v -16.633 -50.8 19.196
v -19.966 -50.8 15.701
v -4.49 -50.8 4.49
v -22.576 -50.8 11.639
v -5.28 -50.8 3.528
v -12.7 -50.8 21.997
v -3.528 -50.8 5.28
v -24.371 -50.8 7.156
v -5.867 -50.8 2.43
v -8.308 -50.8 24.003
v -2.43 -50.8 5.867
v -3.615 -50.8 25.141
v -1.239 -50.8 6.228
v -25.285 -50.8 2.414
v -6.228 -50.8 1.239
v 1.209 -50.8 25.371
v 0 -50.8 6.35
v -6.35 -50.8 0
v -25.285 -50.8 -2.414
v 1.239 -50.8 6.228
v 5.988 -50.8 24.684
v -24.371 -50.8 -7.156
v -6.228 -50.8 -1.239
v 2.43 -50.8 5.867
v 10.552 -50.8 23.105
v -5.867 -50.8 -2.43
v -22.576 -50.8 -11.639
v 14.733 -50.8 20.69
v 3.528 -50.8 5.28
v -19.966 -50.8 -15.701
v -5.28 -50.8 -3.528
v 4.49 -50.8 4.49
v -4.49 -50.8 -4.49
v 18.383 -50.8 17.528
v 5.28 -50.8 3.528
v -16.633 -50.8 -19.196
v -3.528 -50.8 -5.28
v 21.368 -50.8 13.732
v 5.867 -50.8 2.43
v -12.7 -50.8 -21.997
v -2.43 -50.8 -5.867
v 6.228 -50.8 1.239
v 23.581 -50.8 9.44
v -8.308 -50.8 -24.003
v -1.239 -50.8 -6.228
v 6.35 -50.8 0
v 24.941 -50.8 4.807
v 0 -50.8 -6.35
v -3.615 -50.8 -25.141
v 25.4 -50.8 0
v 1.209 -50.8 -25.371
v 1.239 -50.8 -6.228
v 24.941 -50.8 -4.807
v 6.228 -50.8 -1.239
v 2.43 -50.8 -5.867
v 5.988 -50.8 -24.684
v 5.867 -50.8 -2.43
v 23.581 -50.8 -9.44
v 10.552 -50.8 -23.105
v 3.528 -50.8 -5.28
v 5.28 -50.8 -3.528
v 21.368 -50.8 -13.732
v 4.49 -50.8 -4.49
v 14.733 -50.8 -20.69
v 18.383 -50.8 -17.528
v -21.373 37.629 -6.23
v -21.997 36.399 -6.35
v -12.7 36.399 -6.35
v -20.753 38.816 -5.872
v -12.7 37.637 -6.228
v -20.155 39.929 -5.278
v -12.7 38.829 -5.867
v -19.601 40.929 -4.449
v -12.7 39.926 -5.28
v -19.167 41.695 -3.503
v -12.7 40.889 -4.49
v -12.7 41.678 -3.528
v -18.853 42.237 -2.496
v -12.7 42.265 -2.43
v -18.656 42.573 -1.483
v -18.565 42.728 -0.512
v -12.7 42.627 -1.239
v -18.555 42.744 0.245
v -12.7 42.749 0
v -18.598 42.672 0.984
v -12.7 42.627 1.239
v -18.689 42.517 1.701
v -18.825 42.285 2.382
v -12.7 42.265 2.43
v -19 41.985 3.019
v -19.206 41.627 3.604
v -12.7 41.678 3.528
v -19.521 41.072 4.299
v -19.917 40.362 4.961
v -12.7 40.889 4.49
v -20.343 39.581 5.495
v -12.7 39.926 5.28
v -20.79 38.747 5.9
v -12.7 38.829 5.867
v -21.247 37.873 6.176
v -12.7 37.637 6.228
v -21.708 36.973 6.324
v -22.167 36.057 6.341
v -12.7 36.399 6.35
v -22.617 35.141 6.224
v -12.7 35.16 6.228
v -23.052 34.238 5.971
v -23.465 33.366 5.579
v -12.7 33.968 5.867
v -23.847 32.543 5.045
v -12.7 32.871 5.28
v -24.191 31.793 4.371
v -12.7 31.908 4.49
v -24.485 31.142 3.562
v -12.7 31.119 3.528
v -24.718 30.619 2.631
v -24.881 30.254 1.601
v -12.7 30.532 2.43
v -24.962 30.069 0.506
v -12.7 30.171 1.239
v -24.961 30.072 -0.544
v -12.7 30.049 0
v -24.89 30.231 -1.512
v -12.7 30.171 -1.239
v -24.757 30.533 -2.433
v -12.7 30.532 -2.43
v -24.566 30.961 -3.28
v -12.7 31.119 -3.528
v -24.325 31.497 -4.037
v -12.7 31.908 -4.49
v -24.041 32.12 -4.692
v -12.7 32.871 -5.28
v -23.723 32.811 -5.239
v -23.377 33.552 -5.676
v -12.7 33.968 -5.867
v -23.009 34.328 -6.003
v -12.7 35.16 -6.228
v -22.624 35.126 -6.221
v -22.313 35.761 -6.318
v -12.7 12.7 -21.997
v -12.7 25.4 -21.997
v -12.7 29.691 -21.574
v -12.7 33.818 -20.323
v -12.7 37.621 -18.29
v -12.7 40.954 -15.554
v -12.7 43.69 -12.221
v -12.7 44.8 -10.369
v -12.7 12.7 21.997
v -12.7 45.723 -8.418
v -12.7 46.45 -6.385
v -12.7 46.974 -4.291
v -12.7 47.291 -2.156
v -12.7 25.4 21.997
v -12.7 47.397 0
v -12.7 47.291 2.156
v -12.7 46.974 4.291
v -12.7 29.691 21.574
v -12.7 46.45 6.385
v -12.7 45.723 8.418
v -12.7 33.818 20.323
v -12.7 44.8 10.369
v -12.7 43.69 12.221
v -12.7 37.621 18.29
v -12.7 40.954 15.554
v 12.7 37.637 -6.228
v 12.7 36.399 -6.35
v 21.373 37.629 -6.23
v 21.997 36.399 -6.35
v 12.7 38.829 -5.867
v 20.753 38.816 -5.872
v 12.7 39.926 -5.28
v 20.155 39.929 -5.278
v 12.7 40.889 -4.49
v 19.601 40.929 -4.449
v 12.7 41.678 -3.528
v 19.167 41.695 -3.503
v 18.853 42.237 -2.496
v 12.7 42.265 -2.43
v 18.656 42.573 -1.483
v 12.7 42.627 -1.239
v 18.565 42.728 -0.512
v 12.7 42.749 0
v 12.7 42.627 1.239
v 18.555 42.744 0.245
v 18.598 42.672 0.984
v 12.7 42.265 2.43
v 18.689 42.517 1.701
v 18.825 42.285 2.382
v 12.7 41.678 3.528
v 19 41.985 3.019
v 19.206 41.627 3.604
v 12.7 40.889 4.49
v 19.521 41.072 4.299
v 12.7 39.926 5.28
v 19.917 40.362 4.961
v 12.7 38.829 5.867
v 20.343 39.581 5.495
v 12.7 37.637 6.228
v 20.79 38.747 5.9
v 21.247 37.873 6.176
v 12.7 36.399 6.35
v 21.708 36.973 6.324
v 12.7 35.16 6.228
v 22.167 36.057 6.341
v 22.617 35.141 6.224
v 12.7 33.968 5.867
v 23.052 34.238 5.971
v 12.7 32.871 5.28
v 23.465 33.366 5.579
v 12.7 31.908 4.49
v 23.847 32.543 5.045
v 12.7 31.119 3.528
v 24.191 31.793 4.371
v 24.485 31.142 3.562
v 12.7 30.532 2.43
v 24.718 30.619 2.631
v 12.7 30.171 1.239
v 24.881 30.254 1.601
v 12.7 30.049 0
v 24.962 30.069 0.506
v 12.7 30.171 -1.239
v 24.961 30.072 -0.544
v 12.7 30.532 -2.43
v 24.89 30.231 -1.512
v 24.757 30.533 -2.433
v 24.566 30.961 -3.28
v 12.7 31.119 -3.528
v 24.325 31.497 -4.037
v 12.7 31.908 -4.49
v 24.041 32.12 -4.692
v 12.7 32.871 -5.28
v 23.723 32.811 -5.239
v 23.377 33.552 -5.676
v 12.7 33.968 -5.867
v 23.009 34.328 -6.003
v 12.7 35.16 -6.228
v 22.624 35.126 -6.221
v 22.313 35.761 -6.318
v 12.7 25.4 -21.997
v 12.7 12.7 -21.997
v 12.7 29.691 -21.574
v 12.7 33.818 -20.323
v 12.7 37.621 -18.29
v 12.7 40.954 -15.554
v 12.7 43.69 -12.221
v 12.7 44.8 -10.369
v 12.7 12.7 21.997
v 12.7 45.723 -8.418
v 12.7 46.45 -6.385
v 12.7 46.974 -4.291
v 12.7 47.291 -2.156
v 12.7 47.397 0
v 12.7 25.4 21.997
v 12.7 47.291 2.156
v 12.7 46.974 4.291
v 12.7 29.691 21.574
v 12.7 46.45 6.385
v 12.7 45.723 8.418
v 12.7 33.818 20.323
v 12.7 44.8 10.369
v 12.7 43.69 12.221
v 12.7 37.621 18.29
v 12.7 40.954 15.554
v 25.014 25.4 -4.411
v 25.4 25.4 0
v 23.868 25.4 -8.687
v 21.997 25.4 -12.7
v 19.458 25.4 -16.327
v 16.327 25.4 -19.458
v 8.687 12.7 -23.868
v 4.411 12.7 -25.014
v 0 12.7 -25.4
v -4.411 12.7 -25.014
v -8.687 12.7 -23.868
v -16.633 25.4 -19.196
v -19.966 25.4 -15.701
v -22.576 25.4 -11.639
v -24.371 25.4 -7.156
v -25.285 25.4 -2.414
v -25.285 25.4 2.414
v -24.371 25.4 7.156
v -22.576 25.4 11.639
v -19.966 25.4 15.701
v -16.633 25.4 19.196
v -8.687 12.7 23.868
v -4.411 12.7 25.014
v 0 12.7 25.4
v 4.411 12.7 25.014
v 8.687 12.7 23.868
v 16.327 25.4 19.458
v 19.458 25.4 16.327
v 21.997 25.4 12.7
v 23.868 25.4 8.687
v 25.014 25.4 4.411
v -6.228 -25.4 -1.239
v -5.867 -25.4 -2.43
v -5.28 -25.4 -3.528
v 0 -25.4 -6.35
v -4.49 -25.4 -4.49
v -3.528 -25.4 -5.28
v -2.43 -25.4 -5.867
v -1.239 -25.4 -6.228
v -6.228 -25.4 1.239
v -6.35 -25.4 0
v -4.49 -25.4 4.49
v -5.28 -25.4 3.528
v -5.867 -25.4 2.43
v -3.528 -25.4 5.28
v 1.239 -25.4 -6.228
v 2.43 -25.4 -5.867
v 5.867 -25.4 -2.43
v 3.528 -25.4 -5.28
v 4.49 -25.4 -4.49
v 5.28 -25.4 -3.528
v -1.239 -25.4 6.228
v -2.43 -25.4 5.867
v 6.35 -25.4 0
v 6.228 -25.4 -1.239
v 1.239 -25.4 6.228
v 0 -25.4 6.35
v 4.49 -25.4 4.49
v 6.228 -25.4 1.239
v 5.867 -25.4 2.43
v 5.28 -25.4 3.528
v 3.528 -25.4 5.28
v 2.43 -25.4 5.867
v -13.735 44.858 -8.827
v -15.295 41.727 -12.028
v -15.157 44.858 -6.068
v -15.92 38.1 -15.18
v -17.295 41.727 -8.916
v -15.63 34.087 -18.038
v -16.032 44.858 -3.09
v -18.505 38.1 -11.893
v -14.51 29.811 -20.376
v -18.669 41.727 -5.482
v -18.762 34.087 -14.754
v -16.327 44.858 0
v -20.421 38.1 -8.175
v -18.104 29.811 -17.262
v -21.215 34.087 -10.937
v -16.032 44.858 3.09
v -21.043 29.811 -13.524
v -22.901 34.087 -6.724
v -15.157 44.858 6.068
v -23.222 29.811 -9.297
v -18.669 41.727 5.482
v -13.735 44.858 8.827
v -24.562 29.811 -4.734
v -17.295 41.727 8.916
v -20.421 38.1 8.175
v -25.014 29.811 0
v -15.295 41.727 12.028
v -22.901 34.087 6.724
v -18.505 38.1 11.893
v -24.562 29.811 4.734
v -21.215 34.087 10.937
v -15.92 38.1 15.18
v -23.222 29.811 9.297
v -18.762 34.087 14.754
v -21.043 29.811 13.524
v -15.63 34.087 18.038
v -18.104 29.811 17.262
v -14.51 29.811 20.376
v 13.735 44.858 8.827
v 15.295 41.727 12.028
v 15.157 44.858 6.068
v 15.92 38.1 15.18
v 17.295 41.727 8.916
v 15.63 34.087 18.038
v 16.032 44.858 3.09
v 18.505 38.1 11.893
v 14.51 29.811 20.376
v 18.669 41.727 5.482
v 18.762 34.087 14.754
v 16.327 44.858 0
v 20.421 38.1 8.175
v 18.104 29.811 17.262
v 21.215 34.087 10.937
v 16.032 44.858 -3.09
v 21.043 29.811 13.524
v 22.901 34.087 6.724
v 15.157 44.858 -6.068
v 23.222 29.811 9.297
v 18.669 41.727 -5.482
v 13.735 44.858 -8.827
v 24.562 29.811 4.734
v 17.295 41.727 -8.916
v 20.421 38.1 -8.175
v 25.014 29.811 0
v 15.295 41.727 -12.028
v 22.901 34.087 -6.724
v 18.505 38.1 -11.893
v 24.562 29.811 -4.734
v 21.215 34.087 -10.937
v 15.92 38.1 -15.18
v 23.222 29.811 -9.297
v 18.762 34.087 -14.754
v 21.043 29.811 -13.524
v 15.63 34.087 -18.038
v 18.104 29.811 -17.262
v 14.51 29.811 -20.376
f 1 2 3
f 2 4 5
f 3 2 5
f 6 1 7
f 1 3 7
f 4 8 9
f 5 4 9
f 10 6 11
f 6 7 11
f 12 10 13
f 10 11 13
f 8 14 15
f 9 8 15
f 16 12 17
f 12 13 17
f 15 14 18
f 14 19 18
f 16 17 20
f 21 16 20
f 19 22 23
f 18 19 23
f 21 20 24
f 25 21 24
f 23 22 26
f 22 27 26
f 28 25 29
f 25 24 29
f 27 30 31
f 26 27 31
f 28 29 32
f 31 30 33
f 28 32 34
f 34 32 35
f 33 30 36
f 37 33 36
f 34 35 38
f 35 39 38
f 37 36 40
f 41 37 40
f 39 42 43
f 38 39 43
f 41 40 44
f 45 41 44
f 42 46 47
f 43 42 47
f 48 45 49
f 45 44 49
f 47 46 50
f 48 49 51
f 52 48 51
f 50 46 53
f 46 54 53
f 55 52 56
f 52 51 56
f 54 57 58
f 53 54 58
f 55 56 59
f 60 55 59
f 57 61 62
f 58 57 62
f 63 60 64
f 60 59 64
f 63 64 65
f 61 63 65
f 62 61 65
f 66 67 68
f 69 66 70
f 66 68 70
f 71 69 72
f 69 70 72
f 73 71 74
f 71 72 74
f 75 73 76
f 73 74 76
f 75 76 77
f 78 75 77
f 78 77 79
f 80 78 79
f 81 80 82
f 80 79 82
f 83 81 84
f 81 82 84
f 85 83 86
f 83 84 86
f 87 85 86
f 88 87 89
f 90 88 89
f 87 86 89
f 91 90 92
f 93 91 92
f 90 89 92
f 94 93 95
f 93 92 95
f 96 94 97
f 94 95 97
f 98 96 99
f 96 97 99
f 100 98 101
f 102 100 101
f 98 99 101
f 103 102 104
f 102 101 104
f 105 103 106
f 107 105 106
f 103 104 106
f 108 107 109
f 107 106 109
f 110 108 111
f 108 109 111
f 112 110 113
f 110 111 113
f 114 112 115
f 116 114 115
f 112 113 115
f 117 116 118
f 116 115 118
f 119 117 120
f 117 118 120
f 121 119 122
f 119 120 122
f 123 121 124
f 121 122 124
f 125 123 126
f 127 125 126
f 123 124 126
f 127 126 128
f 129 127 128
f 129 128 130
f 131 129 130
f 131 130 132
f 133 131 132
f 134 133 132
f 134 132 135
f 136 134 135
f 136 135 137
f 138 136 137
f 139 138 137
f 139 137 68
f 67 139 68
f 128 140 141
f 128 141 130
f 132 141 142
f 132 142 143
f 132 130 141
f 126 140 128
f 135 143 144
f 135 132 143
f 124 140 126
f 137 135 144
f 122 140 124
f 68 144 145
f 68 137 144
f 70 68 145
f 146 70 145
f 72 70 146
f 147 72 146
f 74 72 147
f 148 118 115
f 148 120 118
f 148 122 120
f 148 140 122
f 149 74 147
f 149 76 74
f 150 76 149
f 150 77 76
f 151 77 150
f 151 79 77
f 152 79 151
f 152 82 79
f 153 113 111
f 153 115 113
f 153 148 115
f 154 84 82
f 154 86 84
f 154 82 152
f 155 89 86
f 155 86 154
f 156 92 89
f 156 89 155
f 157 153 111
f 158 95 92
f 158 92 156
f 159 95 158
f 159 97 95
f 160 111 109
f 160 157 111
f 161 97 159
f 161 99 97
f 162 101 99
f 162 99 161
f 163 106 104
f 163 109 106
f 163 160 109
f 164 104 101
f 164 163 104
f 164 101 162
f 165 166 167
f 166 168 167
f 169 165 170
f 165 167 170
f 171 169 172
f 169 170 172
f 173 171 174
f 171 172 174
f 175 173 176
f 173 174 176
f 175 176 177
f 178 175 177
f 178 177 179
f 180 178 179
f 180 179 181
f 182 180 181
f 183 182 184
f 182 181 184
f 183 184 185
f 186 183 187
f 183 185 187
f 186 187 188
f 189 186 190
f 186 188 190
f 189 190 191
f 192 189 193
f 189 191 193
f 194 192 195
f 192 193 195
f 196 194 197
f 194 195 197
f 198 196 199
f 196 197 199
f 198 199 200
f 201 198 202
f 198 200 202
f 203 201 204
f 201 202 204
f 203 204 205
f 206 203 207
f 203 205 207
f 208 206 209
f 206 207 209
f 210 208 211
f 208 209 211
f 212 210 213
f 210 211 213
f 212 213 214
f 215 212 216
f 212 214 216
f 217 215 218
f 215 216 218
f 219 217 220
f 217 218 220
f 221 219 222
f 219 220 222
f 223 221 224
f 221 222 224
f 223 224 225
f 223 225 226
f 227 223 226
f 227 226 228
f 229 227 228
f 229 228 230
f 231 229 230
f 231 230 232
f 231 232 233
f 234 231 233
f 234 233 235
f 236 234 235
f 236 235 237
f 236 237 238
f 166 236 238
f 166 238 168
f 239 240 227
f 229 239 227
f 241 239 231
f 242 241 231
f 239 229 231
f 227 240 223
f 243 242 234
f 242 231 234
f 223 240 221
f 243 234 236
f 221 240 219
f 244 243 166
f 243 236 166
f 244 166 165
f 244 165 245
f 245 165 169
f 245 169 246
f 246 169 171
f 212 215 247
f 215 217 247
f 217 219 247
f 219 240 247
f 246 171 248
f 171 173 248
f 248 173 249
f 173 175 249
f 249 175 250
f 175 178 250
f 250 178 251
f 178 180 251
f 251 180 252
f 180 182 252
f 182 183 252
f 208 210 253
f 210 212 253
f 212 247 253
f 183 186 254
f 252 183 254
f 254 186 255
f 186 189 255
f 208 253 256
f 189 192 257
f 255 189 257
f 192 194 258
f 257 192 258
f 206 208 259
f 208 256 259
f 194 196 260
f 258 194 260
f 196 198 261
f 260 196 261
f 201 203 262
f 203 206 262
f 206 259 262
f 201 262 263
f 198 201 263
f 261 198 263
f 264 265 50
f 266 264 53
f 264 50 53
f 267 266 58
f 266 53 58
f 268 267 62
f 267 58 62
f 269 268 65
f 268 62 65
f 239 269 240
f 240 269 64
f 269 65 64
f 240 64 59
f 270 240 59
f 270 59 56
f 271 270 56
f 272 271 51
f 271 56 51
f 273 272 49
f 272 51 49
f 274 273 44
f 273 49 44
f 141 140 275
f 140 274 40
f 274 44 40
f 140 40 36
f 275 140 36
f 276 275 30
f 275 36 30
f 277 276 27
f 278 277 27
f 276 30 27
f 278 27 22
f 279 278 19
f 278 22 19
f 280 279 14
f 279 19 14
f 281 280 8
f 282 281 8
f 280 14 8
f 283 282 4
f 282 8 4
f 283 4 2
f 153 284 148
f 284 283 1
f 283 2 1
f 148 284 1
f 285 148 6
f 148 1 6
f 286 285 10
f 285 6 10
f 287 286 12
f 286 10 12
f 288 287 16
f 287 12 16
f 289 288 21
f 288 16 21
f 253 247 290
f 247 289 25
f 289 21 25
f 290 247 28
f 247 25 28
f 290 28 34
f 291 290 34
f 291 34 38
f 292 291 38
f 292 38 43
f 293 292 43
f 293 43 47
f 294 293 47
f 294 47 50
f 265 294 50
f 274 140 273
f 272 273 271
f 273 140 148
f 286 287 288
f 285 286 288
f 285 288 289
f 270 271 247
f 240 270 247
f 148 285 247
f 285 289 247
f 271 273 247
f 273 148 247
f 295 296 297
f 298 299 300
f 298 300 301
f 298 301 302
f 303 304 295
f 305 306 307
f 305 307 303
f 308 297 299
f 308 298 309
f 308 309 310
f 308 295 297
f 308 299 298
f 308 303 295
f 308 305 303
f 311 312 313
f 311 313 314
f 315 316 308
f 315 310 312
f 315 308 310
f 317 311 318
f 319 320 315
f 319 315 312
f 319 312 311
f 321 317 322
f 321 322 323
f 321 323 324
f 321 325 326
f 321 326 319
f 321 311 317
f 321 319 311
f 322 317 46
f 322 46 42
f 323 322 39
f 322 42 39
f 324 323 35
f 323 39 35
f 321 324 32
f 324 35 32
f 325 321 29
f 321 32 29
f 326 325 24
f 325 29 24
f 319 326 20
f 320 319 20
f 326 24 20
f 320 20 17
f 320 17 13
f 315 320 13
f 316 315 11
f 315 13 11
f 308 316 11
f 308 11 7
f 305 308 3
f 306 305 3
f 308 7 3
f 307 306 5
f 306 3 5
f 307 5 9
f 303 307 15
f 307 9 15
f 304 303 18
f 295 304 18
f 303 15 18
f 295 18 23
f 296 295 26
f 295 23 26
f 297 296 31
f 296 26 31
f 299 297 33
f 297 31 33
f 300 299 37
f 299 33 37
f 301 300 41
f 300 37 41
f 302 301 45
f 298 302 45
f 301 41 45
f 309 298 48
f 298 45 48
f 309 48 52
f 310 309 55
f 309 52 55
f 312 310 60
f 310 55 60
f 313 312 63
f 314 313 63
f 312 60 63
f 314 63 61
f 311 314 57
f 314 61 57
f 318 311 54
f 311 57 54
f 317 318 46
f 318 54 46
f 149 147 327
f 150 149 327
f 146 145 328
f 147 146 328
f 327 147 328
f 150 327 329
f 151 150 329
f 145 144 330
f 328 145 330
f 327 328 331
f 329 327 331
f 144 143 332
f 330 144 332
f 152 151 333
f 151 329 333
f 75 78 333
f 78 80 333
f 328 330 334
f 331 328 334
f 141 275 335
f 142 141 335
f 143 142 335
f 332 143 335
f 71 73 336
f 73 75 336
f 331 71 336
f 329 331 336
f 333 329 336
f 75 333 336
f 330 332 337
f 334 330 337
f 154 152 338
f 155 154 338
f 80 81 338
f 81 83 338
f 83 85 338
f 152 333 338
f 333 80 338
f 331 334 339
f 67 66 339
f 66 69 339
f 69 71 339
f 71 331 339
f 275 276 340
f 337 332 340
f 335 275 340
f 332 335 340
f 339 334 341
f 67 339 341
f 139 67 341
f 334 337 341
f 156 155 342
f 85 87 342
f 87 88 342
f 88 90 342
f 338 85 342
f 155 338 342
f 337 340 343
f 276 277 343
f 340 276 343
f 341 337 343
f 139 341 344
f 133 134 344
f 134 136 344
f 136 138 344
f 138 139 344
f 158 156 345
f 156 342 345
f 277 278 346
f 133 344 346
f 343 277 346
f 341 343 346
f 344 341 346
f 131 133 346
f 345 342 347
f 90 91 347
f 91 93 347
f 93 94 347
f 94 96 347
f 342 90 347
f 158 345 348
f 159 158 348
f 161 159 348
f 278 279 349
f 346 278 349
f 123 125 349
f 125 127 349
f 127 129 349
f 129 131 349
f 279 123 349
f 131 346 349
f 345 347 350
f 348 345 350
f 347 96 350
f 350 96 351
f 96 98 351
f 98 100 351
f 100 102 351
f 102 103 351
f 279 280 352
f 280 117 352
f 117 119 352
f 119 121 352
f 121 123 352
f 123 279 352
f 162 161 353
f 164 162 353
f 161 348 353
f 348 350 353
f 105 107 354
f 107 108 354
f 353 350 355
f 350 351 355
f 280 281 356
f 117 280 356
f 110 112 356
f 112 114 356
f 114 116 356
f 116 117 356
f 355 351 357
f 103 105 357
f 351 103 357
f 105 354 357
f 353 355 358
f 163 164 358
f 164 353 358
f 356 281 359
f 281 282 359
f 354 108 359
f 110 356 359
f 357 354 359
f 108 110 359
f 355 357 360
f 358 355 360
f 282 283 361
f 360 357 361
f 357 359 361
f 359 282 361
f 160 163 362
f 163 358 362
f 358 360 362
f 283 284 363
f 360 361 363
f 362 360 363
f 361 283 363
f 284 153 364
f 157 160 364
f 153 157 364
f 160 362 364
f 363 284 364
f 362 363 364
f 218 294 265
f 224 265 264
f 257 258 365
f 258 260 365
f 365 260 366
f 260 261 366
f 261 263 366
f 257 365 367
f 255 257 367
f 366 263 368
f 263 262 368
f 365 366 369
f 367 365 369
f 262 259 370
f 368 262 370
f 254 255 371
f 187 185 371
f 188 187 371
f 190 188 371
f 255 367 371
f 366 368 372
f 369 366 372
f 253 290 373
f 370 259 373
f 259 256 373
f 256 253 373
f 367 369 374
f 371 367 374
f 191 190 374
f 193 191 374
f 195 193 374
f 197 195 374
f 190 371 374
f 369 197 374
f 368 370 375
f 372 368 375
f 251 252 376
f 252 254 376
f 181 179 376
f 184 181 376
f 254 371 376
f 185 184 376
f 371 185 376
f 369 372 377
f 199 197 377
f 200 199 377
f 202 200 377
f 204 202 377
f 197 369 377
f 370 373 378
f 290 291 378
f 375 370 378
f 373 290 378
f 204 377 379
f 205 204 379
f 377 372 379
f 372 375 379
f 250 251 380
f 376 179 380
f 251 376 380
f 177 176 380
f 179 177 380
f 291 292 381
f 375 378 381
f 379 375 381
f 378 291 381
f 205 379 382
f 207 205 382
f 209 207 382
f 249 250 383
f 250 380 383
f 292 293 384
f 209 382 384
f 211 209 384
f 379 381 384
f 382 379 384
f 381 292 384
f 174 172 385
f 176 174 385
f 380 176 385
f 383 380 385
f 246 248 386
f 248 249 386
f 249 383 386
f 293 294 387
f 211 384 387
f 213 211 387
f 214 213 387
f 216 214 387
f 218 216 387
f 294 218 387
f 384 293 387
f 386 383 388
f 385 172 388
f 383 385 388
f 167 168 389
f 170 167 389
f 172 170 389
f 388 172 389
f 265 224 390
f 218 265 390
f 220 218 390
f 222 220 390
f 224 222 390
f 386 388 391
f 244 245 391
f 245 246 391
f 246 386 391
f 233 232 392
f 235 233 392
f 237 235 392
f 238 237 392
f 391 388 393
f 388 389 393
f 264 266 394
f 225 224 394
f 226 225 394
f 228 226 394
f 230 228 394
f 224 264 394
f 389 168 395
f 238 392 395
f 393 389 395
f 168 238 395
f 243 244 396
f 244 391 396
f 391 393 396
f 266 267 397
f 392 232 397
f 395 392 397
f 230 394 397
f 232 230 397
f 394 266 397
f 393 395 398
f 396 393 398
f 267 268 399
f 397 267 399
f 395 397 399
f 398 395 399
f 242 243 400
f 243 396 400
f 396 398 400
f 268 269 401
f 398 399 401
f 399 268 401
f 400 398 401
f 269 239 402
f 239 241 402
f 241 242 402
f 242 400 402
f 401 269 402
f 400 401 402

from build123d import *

# Parameters (mm, degrees)
SKETCH2_W          = 25.4
SKETCH2_H          = 38.1
CUT_EXTRUDE1_DEPTH = 101.6
SKETCH3_R          = 6.35
CUT_EXTRUDE2_DEPTH = 101.6
SKETCH4_R          = 6.35
CUT_EXTRUDE3_DEPTH = 25.4


with BuildPart() as part:
    # Sketch1 → Revolve3 (revolve)
    with BuildSketch(Plane.XY):
        with BuildLine():
            Line((0, -50.8), (0, 50.8))
            ThreePointArc((0, 50.8), (17.960512242, 43.360512242), (25.4, 25.4))
            Line((25.4, 25.4), (25.4, -50.8))
            Line((25.4, -50.8), (0, -50.8))
        make_face()
    revolve(axis=Axis((0, -50.8, 0), (0, 1, 0)))

    # Sketch2 → Cut-Extrude1 (cut, symmetric)
    with BuildSketch(Plane.XY):
        with Locations((0, 31.75)):
            Rectangle(SKETCH2_W, SKETCH2_H)
    extrude(amount=CUT_EXTRUDE1_DEPTH, both=True, mode=Mode.SUBTRACT)

    # Sketch3 → Cut-Extrude2 (cut, symmetric)
    with BuildSketch(Plane(origin=(-12.7, 0, 0), x_dir=(0, 0, -1), z_dir=(1, 0, 0))):
        with Locations((0, 36.398522628)):
            Circle(SKETCH3_R)
    extrude(amount=CUT_EXTRUDE2_DEPTH, both=True, mode=Mode.SUBTRACT)

    # Sketch4 → Cut-Extrude3 (cut)
    with BuildSketch(Plane.XZ.offset(50.8)):
        Circle(SKETCH4_R)
    extrude(amount=-CUT_EXTRUDE3_DEPTH, mode=Mode.SUBTRACT)


solid = part.part
